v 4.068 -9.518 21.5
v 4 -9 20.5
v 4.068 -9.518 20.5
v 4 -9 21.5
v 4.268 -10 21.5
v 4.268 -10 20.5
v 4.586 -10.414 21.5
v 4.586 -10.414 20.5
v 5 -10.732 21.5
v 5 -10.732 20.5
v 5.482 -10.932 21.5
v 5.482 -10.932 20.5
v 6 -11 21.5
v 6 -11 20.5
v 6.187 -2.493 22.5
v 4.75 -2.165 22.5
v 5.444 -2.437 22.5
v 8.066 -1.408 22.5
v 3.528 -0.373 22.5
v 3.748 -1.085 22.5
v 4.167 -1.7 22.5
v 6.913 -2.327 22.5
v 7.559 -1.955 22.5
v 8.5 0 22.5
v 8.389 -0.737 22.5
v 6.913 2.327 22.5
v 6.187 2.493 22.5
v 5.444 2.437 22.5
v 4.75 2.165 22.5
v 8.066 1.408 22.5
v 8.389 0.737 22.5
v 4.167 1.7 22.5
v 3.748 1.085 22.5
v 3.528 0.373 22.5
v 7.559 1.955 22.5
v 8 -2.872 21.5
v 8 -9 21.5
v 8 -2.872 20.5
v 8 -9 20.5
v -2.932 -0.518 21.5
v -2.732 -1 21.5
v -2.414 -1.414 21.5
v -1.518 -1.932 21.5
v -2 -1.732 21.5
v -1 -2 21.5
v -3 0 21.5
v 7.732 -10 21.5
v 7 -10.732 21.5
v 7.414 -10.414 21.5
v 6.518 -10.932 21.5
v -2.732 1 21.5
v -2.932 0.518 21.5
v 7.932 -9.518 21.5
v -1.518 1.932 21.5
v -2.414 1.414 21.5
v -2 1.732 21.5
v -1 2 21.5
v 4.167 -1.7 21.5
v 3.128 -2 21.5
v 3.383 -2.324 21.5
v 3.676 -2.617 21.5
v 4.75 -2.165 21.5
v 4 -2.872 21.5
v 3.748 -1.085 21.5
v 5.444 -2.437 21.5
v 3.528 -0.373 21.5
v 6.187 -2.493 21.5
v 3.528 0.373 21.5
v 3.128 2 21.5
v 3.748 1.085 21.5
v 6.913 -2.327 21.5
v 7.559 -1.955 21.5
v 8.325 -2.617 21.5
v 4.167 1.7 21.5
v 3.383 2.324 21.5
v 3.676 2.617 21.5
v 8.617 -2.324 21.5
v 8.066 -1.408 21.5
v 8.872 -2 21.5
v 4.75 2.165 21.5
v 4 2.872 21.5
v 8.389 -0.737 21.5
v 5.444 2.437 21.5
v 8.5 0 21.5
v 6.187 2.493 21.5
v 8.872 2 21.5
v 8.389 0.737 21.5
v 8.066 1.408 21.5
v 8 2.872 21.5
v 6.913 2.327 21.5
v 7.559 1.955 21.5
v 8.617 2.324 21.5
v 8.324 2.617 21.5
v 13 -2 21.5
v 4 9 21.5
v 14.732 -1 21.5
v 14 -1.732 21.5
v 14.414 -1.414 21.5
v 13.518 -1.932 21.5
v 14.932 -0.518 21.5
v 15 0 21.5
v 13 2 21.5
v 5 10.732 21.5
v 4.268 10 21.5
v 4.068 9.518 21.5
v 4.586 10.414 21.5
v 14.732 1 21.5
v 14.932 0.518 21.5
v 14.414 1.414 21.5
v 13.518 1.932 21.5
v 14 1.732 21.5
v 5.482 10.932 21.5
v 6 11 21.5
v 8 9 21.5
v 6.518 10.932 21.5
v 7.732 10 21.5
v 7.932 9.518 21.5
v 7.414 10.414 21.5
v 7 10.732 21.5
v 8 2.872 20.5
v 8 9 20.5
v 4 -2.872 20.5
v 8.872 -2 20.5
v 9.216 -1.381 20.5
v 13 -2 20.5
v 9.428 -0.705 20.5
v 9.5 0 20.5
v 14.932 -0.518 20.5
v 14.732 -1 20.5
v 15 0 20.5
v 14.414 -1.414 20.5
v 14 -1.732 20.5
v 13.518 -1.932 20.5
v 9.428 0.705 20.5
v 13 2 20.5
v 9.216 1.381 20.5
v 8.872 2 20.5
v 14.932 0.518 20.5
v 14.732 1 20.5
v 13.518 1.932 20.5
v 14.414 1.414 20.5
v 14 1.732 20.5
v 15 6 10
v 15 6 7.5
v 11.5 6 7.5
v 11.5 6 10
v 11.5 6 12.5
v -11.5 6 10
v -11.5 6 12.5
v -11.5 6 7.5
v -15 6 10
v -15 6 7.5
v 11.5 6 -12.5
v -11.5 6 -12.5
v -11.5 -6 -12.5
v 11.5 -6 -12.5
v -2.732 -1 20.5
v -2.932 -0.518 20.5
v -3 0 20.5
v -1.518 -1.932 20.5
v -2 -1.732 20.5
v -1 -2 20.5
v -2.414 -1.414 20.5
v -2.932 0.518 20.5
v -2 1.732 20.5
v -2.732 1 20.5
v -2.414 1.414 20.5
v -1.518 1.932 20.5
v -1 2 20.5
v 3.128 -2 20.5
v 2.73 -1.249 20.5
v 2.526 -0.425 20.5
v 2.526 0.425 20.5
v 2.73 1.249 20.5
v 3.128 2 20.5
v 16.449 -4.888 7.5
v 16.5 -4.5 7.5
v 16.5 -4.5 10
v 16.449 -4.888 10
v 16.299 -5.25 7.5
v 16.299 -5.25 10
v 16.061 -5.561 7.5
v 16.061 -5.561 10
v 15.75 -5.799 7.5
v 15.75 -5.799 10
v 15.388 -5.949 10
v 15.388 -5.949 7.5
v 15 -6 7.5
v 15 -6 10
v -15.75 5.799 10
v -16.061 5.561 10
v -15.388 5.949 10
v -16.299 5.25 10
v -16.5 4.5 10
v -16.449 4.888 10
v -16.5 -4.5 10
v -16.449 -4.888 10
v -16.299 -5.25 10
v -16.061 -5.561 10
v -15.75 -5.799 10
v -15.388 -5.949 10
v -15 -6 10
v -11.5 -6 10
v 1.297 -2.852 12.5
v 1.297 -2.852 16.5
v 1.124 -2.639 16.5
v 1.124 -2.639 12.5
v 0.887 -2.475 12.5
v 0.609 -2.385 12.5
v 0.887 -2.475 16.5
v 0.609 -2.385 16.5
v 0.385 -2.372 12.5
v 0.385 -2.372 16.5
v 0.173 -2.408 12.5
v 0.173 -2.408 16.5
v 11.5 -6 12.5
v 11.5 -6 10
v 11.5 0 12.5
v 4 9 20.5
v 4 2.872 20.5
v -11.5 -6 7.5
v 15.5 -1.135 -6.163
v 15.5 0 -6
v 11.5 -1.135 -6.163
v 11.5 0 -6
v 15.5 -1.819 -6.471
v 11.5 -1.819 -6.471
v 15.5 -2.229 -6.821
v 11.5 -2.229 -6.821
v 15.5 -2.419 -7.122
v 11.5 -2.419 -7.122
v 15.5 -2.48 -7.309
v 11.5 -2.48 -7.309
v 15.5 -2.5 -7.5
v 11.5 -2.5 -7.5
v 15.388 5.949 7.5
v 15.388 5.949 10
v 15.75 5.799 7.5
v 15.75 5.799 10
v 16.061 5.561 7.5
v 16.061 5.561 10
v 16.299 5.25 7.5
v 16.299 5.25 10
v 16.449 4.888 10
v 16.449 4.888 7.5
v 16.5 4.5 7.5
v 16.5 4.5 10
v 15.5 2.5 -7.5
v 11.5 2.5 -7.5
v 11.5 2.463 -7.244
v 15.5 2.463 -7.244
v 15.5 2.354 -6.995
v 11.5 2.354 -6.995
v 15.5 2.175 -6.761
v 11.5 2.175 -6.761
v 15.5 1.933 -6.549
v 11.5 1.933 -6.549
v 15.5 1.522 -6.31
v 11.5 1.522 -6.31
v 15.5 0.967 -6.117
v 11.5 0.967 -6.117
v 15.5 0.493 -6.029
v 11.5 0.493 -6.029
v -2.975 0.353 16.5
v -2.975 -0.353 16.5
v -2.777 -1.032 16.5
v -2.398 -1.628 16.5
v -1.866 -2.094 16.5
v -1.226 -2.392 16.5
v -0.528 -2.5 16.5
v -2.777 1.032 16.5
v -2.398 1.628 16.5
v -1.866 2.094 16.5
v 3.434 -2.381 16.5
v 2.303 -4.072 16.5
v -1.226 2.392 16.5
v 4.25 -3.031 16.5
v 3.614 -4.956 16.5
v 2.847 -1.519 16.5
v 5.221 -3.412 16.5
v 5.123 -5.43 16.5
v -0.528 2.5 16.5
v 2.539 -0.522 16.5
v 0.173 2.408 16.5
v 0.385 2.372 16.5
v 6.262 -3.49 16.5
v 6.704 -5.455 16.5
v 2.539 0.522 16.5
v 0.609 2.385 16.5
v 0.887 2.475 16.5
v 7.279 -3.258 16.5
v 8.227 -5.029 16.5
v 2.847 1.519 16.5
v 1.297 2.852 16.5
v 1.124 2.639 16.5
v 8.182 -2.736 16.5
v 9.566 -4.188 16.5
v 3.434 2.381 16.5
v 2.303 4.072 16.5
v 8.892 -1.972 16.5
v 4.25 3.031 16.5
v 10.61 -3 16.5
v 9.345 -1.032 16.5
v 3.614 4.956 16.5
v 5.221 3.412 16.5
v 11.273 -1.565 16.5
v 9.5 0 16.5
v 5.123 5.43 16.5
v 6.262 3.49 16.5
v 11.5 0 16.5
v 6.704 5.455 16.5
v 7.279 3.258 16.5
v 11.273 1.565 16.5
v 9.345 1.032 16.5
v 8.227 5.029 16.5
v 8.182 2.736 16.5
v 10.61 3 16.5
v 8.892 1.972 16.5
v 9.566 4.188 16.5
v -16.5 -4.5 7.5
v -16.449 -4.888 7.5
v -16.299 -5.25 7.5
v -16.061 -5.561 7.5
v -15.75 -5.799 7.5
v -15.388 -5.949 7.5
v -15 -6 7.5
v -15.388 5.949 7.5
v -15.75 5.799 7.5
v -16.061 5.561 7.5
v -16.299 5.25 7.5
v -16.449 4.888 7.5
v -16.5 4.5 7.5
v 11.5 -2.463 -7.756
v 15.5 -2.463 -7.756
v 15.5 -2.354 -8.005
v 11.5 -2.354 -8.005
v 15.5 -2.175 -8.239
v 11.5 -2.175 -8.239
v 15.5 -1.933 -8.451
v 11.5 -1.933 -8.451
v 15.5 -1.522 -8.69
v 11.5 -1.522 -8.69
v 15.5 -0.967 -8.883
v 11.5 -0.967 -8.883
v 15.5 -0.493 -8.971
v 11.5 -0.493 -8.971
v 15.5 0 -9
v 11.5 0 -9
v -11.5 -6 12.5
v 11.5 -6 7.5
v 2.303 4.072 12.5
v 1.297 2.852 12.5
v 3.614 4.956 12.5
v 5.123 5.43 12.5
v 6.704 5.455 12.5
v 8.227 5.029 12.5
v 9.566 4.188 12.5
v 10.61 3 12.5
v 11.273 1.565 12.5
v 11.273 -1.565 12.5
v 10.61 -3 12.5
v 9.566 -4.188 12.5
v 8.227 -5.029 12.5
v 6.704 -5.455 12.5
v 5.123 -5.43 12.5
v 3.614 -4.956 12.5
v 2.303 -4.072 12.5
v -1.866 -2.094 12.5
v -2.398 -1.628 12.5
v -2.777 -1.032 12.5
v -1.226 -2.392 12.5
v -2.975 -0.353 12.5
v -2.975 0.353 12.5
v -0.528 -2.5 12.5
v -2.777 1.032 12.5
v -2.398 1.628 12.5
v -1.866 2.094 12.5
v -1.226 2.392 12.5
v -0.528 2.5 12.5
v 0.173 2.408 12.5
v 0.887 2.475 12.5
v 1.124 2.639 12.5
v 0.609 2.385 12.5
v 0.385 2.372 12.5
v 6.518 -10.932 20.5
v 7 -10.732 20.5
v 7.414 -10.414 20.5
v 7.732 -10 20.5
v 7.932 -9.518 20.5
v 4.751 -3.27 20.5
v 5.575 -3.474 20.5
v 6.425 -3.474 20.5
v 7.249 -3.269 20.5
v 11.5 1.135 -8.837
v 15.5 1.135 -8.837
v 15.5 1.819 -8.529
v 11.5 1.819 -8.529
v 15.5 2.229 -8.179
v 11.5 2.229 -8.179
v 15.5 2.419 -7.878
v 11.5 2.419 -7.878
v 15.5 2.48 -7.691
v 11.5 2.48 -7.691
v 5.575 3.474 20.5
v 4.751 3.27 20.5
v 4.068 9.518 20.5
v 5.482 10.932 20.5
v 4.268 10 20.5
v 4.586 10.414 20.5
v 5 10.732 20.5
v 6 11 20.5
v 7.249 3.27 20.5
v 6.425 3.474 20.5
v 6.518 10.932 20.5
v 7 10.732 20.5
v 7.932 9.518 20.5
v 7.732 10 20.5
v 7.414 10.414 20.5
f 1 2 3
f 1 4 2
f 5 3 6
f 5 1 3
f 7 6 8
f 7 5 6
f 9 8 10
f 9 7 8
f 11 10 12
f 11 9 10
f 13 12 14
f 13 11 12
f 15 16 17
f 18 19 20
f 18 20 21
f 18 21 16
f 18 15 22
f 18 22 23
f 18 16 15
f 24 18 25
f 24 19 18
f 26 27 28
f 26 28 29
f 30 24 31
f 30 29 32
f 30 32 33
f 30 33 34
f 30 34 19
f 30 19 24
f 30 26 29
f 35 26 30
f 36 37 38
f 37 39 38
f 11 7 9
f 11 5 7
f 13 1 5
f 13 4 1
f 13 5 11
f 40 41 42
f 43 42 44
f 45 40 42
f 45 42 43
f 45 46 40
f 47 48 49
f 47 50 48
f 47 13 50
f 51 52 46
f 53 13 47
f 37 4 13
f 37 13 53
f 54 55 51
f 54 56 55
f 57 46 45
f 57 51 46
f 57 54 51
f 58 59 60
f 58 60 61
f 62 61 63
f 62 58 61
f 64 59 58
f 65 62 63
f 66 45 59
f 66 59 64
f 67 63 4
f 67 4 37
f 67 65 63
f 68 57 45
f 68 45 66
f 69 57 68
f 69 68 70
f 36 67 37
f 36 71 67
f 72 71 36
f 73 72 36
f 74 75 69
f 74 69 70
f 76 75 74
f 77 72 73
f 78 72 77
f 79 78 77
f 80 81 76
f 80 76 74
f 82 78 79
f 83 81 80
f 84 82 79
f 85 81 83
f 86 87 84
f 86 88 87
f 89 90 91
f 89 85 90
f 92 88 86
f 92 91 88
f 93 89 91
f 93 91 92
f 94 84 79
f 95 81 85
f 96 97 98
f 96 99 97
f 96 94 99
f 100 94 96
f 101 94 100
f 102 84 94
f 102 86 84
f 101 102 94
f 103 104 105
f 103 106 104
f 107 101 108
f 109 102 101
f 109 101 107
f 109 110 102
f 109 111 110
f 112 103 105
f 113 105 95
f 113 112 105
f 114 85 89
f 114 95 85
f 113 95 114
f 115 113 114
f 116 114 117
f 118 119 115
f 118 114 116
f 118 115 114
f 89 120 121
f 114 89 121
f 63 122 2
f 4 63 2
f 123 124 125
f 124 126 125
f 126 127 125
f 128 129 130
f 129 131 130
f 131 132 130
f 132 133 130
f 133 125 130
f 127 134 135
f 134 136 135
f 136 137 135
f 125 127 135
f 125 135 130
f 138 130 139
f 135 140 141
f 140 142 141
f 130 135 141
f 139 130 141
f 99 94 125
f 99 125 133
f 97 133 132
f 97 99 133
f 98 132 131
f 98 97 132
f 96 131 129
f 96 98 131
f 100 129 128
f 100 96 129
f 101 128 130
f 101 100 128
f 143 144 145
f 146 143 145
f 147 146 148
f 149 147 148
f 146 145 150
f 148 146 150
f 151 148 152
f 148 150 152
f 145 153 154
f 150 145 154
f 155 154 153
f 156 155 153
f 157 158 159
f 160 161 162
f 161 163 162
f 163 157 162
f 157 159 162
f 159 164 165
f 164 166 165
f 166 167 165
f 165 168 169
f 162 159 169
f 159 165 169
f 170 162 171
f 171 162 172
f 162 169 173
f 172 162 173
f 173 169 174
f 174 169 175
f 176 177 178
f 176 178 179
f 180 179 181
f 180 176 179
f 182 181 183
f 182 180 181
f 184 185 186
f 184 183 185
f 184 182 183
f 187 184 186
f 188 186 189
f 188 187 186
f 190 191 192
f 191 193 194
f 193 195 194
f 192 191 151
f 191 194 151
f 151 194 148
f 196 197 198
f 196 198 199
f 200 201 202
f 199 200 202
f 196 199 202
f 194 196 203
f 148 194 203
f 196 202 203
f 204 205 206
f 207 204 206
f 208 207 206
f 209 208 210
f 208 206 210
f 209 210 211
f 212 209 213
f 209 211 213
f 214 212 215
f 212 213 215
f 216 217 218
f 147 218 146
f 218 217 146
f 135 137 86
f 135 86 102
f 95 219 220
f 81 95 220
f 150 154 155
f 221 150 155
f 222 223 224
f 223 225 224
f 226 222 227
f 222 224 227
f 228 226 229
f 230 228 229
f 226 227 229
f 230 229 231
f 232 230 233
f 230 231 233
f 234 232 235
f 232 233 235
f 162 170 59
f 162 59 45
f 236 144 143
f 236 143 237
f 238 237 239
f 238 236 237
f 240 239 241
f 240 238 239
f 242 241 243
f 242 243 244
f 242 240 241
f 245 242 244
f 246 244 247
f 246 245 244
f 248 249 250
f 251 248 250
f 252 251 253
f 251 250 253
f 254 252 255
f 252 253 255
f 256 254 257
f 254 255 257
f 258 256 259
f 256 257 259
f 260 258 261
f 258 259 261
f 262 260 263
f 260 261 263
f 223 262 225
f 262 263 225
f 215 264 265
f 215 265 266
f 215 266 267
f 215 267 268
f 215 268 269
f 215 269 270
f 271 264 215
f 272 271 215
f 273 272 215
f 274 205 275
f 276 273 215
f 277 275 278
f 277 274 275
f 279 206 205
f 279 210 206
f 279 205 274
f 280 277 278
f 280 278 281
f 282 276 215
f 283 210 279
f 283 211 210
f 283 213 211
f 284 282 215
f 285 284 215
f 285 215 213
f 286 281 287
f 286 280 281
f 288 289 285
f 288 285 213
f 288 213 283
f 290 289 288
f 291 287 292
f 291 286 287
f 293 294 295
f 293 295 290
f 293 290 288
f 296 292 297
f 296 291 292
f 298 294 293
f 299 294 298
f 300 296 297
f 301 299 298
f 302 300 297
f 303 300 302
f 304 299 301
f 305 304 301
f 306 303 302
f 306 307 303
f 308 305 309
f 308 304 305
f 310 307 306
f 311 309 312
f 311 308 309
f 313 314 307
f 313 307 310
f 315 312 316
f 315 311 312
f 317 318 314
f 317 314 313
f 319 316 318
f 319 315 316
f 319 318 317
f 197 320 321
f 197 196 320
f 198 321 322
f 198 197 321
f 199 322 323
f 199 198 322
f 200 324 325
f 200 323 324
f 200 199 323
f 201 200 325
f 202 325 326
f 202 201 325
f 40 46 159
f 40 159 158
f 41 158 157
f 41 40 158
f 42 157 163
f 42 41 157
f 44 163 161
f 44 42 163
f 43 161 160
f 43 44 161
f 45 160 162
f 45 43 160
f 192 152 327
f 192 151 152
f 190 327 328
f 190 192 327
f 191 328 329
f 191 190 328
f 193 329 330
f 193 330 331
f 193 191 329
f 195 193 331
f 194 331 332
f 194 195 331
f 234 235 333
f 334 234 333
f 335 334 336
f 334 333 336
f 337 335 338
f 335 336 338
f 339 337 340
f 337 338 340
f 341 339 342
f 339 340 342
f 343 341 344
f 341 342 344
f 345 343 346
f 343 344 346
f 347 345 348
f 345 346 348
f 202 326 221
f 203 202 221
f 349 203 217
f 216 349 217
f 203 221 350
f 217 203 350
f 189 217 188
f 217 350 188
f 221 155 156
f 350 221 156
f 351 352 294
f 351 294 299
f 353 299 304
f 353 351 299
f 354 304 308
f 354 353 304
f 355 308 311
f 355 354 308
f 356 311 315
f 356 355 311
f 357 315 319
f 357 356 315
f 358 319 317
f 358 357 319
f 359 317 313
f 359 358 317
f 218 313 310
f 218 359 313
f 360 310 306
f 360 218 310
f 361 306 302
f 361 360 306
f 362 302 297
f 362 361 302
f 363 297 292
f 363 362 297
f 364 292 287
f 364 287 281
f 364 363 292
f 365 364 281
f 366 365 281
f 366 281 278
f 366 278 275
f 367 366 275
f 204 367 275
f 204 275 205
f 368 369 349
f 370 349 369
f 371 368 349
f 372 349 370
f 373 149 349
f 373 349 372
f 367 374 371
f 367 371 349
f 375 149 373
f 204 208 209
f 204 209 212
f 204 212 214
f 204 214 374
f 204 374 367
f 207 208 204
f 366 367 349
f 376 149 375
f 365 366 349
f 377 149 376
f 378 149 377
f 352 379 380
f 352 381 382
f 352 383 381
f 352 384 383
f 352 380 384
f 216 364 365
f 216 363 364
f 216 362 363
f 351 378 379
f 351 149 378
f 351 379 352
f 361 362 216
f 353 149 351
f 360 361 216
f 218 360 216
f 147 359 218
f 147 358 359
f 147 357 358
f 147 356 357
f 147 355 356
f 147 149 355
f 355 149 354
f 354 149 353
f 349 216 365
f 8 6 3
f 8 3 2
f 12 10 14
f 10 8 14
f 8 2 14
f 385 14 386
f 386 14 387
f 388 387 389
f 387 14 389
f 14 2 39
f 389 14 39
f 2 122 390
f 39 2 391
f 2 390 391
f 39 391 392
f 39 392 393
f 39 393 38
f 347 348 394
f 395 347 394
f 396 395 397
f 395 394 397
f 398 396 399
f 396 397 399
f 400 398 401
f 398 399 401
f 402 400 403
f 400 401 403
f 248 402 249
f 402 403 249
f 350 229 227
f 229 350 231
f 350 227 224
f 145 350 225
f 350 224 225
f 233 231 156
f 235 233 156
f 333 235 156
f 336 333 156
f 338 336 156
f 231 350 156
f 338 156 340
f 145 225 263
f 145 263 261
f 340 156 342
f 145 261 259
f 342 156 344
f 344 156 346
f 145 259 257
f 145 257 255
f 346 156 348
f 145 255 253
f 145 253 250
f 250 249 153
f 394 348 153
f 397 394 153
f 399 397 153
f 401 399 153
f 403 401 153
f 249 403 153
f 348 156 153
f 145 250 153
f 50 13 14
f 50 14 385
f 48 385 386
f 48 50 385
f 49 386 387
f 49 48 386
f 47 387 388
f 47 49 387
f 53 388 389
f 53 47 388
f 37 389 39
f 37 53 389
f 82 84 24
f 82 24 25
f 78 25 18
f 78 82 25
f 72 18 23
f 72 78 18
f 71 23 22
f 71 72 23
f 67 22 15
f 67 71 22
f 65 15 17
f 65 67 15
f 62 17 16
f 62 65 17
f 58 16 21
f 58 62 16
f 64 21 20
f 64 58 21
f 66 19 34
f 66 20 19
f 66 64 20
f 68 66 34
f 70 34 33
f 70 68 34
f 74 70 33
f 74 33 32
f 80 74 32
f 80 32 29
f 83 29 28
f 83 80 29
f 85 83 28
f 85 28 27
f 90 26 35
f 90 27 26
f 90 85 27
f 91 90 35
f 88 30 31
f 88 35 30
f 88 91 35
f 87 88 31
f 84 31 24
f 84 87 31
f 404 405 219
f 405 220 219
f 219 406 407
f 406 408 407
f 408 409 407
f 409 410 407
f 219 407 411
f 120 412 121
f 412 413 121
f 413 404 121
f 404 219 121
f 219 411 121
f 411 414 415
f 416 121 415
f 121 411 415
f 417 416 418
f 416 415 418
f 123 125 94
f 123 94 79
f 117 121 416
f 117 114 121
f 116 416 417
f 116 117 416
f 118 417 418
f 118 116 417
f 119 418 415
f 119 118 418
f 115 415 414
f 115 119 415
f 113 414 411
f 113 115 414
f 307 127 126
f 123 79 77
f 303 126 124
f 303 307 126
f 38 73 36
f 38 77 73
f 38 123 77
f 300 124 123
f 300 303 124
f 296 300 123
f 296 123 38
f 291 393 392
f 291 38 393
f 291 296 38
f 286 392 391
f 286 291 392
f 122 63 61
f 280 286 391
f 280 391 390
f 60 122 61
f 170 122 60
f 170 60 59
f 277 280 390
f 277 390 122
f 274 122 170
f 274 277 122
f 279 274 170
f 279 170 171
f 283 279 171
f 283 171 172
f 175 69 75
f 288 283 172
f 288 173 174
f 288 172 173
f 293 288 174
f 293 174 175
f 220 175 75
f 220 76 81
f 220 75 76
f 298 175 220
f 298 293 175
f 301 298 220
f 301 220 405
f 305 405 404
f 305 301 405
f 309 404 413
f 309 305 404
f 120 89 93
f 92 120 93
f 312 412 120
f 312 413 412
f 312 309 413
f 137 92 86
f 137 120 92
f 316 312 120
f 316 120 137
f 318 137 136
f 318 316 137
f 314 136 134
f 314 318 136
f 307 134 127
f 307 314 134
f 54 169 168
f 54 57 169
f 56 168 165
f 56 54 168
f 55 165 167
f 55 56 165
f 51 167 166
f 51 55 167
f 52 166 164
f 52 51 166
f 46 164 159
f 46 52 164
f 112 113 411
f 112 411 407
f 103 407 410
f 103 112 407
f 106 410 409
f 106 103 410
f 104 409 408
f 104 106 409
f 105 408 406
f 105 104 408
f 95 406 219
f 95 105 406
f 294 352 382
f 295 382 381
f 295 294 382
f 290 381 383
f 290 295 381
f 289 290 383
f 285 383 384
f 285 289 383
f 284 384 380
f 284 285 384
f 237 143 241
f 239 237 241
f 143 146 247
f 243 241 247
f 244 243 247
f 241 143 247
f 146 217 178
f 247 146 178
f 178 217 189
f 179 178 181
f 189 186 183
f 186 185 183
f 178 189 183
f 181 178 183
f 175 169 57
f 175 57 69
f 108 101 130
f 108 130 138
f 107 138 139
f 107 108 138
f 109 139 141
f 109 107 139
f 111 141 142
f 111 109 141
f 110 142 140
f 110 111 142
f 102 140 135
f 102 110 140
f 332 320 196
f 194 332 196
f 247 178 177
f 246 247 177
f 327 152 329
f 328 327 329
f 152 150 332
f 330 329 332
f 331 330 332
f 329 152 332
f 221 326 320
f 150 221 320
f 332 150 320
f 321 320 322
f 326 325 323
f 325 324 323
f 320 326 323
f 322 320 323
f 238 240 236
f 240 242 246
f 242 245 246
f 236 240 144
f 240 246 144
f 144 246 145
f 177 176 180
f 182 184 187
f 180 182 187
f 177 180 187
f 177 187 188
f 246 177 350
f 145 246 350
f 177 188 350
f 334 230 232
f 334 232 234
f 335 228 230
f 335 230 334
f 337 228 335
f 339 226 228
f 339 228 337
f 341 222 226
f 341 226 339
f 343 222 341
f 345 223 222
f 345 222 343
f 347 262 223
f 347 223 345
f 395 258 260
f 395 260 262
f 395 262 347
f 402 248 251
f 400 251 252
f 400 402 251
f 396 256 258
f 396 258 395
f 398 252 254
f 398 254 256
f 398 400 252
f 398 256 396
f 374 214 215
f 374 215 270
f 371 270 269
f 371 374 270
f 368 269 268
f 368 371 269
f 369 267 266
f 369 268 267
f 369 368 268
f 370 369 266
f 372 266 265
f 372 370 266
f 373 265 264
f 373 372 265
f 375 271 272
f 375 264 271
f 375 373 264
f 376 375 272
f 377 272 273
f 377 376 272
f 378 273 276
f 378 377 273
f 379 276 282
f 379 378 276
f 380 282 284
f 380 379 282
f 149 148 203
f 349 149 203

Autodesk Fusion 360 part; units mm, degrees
sketch "Skizze1" plane through (0, 0, 0) normal (0, 0, 1) x (1, 0, 0)
  line L0 (11.5, 6) -> (-11.5, 6)
  line L1 (-11.5, 6) -> (-11.5, -6)
  line L2 (-11.5, -6) -> (11.5, -6)
  line L3 (11.5, -6) -> (11.5, 6)
  line L4 (11.5, 6) -> (-11.5, -6) construction
  line L5 (-11.5, 6) -> (11.5, -6) construction
  dimension "d1" = 23
  dimension "d2" = 12
extrude "Extrusion1" add sketch "Skizze1" along normal mid plane 25
sketch "Skizze2" plane through (0, -6, 0) normal (0, -1, 0) x (1, 0, 0)
  line L0 (11.5, -12.5) -> (11.5, 12.5)
  line L1 (11.5, 12.5) -> (-11.5, 12.5)
  line L2 (-11.5, 12.5) -> (-11.5, -12.5)
  line L3 (-11.5, -12.5) -> (11.5, -12.5)
  line L4 (-16.5, 10) -> (16.5, 10)
  line L5 (16.5, 10) -> (16.5, 7.5)
  line L6 (16.5, 7.5) -> (-16.5, 7.5)
  line L7 (-16.5, 7.5) -> (-16.5, 10)
  dimension "d5" = 2.5
  dimension "d6" = 2.5
  dimension "d7" = 5
  dimension "d8" = 5
extrude "Extrusion2" add sketch "Skizze2" against normal blind 12 contours L0 L4 L5 L6 | L2 L4 L6 L7
fillet "Abrundung1" radius 1.5 4 edges at (16.5, -6, 8.75) (16.5, 6, 8.75) (-16.5, -6, 8.75) (-16.5, 6, 8.75)
sketch "Skizze3" plane through (0, 0, 12.5) normal (0, 0, 1) x (1, 0, 0)
  line L0 (11.5, -6) -> (11.5, 6)
  line L1 (11.5, 6) -> (-11.5, 6)
  line L2 (-11.5, 6) -> (-11.5, -6)
  line L3 (-11.5, -6) -> (11.5, -6)
  circle A0 centre (6, 0) radius 5.5
  circle A1 centre (-0.5, 0) radius 2.5
  dimension "d13" = 11
  dimension "d15" = 5
  dimension "d16" = 12
extrude "Extrusion3" add sketch "Skizze3" along normal blind 4 contours A0 A1 | A0 A1 | A0 A1
fillet "Abrundung2" radius 1 2 edges at (0.9038, -2.0686, 14.5) (0.9038, 2.0686, 14.5)
sketch "Skizze4" plane through (11.5, 0, 0) normal (1, 0, 0) x (0, 0, -1)
  line L0 (-7.5, 6) -> (-7.5, -6)
  line L1 (-7.5, -6) -> (12.5, -6)
  line L2 (12.5, -6) -> (12.5, 6)
  line L3 (12.5, 6) -> (-7.5, 6)
  ellipse E0 centre (7.5, 0) end of major axis (7.5, 2.5) minor radius 1.5
  line L4 (7.5, -2.5) -> (7.5, 2.5)
  line L5 (9, 0) -> (6, 0)
  dimension "d21" = 5
  dimension "d22" = 3
  dimension "d23" = 5
extrude "Extrusion4" add sketch "Skizze4" along normal blind 4 contours E0 L4 L5 | E0 L4 L5 | E0 L4 L5 | E0 L4 L5
sketch "Skizze5" plane through (0, 0, 16.5) normal (0, 0, 1) x (1, 0, 0)
  arc A0 (1.2973, -2.8522) -> (1.2973, 2.8522) centre (6, 0) ccw
  arc A1 (0.1731, 2.4077) -> (1.2973, 2.8522) centre (0.4423, 3.3708) ccw
  arc A2 (0.1731, 2.4077) -> (0.1731, -2.4077) centre (-0.5, 0) ccw
  arc A3 (1.2973, -2.8522) -> (0.1731, -2.4077) centre (0.4423, -3.3708) ccw
  circle A4 centre (6, 0) radius 3.5
  dimension "d26" = 7
extrude "Extrusion5" add sketch "Skizze5" along normal blind 4 contours A4
sketch "Skizze6" plane through (0, 0, 20.5) normal (0, 0, 1) x (1, 0, 0)
  circle A0 centre (6, 0) radius 3.5
  line L0 (8, 11) -> (4, 11)
  line L1 (4, -11) -> (8, -11)
  line L2 (8, 11) -> (4, -11) construction
  line L3 (4, 11) -> (8, -11) construction
  line L4 (-3, -2) -> (-3, 2)
  line L5 (15, 2) -> (15, -2)
  line L6 (15, -2) -> (-3, 2) construction
  line L7 (-3, -2) -> (15, 2) construction
  line L8 (-3, 2) -> (3.1277, 2)
  line L9 (5.6364, 2) -> (6.3636, 2)
  line L10 (8.8723, 2) -> (15, 2)
  line L11 (4, 11) -> (4, 2.8723)
  line L12 (8, 2.8723) -> (8, 11)
  line L13 (8, -11) -> (8, -2)
  line L14 (8, -0.4444) -> (8, 0.4444)
  line L15 (15, -2) -> (8.8723, -2)
  line L16 (6.3636, -2) -> (5.6364, -2)
  line L17 (3.1277, -2) -> (-3, -2)
  line L18 (4, 0.4444) -> (4, -0.4444)
  line L19 (4, -2.8723) -> (4, -11)
  point P0 (6, 0)
  point P1 (6, 0)
  dimension "d29" = 4
  dimension "d30" = 4
  dimension "d31" = 18
  dimension "d32" = 22
extrude "Extrusion6" add sketch "Skizze6" along normal blind 1
fillet "Abrundung3" radius 2 8 edges at (-3, -2, 21) (4, -11, 21) (8, -11, 21) (15, -2, 21) (15, 2, 21) (8, 11, 21) (4, 11, 21) (-3, 2, 21)
sketch "Skizze7" plane through (0, 0, 21.5) normal (0, 0, 1) x (1, 0, 0)
  arc A0 (-1, 2) -> (-1, -2) centre (-1, 0) ccw
  line L0 (-1, -2) -> (3.1277, -2)
  arc A1 (3.1277, -2) -> (4, -2.8723) centre (6, 0) ccw
  line L1 (4, -2.8723) -> (4, -9)
  arc A2 (4, -9) -> (8, -9) centre (6, -9) ccw
  line L2 (8, -9) -> (8, -2.8723)
  arc A3 (8, -2.8723) -> (8.8723, -2) centre (6, 0) ccw
  line L3 (8.8723, -2) -> (13, -2)
  arc A4 (13, -2) -> (13, 2) centre (13, 0) ccw
  line L4 (13, 2) -> (8.8723, 2)
  arc A5 (8.8723, 2) -> (8, 2.8723) centre (6, 0) ccw
  line L5 (8, 2.8723) -> (8, 9)
  arc A6 (8, 9) -> (4, 9) centre (6, 9) ccw
  line L6 (4, 9) -> (4, 2.8723)
  arc A7 (4, 2.8723) -> (3.1277, 2) centre (6, 0) ccw
  line L7 (3.1277, 2) -> (-1, 2)
  circle A8 centre (6, 0) radius 2.5
  dimension "d37" = 5
extrude "Extrusion7" add sketch "Skizze7" along normal blind 1 contours A8
equation "d8 = d7"
equation "d30 = d29"
